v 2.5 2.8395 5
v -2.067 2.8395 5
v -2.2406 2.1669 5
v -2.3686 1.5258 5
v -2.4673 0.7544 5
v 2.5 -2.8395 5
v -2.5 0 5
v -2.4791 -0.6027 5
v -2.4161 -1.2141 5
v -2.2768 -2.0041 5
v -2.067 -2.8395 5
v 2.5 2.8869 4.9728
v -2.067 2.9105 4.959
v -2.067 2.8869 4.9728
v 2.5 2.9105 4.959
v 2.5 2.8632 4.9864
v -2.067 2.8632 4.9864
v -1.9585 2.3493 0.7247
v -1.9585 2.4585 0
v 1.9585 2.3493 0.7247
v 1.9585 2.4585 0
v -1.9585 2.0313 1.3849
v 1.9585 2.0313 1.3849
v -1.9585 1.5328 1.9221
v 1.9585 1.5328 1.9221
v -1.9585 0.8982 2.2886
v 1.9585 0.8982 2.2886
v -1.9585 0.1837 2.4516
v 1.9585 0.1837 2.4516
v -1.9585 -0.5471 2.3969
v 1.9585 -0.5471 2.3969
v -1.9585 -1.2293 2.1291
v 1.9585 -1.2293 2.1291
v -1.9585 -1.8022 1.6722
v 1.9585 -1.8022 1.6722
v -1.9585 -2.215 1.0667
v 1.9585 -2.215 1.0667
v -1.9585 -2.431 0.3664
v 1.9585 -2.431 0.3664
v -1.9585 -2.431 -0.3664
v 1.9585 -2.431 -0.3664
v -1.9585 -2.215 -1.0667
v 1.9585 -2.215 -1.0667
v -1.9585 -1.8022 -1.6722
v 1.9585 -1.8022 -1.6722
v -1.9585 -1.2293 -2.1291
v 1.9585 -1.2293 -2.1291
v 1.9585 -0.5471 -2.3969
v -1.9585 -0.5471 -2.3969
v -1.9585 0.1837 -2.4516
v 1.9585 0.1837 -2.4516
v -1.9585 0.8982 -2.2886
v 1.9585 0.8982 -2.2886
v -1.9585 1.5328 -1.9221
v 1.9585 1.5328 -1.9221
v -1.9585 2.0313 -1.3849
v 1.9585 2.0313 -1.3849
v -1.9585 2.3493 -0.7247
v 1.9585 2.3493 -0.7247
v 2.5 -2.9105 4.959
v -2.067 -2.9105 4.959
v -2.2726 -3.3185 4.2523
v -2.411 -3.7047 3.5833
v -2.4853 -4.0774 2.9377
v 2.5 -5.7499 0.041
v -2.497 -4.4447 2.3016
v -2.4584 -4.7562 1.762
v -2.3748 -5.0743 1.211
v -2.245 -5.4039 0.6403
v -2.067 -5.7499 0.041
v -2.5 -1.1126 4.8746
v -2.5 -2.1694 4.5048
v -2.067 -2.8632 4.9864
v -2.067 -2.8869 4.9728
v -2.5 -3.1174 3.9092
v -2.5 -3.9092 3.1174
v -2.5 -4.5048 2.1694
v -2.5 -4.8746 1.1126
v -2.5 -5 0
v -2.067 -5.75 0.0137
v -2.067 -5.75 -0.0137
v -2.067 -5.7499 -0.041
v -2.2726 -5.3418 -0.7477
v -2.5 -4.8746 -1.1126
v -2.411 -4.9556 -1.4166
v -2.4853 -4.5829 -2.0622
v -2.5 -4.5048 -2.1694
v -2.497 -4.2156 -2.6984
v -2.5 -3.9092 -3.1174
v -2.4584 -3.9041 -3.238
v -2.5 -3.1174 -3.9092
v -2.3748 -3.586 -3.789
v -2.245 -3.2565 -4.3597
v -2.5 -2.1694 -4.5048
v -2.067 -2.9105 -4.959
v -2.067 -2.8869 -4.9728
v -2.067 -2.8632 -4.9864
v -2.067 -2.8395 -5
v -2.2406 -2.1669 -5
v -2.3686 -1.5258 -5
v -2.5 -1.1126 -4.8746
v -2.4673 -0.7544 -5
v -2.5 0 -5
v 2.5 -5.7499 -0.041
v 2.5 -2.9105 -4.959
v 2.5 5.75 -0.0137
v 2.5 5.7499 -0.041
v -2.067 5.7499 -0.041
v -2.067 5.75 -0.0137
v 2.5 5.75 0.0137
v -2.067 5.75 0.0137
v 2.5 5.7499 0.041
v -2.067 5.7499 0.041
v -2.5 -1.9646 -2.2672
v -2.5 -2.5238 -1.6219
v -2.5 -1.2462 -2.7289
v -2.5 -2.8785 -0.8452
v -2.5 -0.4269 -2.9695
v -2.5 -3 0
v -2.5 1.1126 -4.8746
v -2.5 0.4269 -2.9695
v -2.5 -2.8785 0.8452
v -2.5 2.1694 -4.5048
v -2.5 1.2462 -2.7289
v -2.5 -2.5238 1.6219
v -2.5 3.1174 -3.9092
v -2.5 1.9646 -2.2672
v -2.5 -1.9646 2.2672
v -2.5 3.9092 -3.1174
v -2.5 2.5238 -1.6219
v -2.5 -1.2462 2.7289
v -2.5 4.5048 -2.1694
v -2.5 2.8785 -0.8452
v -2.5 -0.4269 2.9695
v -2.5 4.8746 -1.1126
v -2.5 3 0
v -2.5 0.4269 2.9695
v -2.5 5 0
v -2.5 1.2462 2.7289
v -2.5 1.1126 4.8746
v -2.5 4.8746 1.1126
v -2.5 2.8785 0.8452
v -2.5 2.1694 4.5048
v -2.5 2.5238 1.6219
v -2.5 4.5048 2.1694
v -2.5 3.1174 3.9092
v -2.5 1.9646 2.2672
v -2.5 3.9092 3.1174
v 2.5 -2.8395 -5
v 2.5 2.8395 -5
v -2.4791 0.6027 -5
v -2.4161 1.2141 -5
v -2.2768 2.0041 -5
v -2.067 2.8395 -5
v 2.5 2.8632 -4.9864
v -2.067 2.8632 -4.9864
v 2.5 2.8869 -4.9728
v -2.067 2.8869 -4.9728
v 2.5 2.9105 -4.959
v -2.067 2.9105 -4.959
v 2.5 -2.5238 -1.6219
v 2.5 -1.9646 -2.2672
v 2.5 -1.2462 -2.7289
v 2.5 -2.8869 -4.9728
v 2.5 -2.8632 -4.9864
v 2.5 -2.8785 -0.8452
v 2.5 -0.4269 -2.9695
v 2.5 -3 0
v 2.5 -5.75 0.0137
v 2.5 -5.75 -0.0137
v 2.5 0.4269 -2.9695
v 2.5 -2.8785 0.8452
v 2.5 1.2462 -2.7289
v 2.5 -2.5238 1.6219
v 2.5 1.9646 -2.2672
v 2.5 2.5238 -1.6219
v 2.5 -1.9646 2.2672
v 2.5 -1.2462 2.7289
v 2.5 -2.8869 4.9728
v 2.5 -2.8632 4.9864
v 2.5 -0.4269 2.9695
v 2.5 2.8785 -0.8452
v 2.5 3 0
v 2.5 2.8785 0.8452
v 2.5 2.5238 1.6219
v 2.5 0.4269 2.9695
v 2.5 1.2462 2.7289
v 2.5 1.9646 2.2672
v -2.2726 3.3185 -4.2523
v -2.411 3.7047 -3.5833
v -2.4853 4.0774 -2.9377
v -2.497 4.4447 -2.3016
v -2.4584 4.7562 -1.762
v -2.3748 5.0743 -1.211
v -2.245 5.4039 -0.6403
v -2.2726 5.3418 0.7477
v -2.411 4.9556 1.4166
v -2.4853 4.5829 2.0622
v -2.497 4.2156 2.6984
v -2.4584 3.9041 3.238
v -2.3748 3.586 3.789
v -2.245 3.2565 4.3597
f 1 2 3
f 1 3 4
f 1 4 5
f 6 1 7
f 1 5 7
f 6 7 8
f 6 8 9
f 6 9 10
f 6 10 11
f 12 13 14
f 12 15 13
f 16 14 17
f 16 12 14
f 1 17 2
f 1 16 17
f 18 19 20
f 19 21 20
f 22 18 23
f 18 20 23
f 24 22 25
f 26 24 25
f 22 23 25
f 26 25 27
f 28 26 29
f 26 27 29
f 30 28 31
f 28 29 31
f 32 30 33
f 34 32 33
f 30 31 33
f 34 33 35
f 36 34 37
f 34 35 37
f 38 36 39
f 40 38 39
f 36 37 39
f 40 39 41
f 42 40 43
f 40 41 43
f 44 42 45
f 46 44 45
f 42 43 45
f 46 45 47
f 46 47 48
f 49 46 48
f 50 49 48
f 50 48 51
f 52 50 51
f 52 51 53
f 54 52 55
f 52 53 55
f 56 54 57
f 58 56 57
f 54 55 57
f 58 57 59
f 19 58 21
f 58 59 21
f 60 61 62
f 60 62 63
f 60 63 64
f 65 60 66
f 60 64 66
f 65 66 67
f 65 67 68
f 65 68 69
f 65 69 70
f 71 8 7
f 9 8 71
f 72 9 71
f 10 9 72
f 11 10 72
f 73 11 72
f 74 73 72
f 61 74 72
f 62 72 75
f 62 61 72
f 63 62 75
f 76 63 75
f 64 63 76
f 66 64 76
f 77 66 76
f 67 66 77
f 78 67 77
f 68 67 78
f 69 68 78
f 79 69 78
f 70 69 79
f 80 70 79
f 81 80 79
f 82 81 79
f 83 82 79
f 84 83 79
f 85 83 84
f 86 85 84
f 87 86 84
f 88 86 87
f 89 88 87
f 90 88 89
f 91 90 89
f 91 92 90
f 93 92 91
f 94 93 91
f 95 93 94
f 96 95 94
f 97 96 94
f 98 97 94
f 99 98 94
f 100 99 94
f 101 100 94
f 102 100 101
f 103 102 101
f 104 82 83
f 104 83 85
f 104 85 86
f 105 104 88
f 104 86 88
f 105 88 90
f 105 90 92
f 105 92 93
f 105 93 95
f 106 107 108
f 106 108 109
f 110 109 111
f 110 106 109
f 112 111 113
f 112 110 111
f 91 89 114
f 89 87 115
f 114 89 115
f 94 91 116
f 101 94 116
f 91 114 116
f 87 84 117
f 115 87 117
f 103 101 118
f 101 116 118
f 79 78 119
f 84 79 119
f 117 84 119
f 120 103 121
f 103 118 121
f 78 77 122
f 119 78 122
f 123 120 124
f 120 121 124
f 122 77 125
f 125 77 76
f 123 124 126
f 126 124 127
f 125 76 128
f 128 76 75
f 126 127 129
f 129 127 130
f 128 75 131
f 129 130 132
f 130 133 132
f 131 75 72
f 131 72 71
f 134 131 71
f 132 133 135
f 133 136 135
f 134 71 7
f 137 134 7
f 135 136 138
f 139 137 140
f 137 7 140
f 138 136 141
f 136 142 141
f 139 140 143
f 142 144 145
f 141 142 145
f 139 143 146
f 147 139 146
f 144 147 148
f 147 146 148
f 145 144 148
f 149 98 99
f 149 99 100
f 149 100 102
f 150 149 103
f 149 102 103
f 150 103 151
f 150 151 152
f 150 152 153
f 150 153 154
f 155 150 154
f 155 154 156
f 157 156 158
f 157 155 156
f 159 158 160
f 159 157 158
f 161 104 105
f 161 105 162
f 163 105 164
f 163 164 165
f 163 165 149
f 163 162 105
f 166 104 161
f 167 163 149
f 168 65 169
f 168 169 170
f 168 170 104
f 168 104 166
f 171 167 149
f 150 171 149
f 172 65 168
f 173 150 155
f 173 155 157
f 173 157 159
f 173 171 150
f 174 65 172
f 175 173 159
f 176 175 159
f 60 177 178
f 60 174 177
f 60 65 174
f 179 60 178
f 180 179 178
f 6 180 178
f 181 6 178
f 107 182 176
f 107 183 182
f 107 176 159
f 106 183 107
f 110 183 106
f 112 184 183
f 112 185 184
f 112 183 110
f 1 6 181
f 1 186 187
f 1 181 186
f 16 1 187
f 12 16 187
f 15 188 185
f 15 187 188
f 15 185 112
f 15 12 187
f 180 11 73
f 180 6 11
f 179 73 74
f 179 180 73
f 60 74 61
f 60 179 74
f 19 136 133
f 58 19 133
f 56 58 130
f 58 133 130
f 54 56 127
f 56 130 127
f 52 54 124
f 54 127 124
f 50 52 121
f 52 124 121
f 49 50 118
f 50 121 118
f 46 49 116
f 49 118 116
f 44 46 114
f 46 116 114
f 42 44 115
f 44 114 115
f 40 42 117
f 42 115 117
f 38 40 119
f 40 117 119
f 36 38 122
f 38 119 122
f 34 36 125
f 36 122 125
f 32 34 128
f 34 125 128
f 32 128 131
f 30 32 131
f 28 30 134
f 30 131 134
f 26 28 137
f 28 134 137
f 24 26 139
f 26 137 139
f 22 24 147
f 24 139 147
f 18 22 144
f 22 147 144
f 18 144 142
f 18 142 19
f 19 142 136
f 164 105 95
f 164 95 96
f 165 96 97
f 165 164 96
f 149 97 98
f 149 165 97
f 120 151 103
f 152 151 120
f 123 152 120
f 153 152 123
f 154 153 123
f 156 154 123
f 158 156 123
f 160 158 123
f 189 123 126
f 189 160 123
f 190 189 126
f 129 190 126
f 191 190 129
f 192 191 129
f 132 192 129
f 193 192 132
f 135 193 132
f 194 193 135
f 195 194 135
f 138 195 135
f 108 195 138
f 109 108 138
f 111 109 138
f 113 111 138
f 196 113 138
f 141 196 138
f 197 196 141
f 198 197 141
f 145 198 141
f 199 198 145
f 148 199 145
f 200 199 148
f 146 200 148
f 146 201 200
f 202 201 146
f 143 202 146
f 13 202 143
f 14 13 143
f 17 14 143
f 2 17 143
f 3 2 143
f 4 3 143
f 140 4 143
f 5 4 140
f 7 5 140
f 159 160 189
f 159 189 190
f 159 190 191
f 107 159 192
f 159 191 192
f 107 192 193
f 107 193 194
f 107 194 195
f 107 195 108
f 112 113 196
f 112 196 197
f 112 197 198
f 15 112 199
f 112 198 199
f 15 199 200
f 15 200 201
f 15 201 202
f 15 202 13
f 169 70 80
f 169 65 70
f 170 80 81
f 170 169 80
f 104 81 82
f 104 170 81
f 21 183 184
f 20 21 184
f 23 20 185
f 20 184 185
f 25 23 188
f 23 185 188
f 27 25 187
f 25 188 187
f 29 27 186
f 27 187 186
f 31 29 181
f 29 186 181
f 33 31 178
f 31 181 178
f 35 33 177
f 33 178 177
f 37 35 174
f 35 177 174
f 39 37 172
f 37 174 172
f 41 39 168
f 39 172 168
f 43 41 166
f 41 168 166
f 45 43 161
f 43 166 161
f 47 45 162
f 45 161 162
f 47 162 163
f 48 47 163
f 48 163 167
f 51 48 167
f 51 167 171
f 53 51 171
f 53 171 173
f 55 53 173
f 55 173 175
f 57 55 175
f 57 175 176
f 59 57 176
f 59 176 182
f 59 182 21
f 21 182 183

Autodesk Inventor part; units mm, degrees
sketch "Sketch_1" plane through (0, 0, 0) normal (0, 0, 1) x (1, 0, 0)
  line L0 (2.5, 0) -> (-2.5, 0)
  line L1 (-2.5, 0) -> (-2.5, 5)
  line L2 (-2.5, 5) -> (-2.067, 5.75)
  line L3 (-2.067, 5.75) -> (2.5, 5.75)
  line L4 (2.5, 5.75) -> (2.5, 0)
  line L5 (2.5, 0) -> (-2.5, 0)
revolve "Revolution1" add sketch "Sketch_1" angle 360 about axis through (2.5, 0, 0) along (1, 0, 0)
sketch "Sketch_2" plane through (0, 0, 0) normal (0, 0, 1) x (1, 0, 0)
  line L0 (2.5, 0) -> (-2.5, 0)
  line L1 (-2.5, 0) -> (-2.5, 3)
  line L2 (-2.5, 3) -> (-1.9585, 2.4585)
  line L3 (-1.9585, 2.4585) -> (1.9585, 2.4585)
  line L4 (1.9585, 2.4585) -> (2.5, 3)
  line L5 (2.5, 3) -> (2.5, 0)
  line L6 (2.5, 0) -> (-2.5, 0)
revolve "Revolution2" cut sketch "Sketch_2" angle 360 about axis through (2.5, 0, 0) along (1, 0, 0)
thread "Thread1" size "M6x1" class "6H" standard "ISO Metric profile" full length
sketch "Sketch_3" plane through (0, 0, 0) normal (1, 0, 0) x (0, 1, 0)
  line L0 (-10, 10) -> (-10, -10)
  line L1 (-10, -10) -> (10, -10)
  line L2 (10, -10) -> (10, 10)
  line L3 (10, 10) -> (-10, 10)
  line L4 (-2.8868, 5) -> (-5.7735, 0)
  line L5 (-5.7735, 0) -> (-2.8868, -5)
  line L6 (-2.8868, -5) -> (2.8868, -5)
  line L7 (2.8868, -5) -> (5.7735, 0)
  line L8 (5.7735, 0) -> (2.8868, 5)
  line L9 (2.8868, 5) -> (-2.8868, 5)
extrude "Extrusion1" cut sketch "Sketch_3" along normal mid plane 5
ref_plane "cp_XY" through (2.5, 0, 0) normal (1, 0, 0) x (0, 0, -1)
ref_plane "cp_YZ" through (2.5, 0, 0) normal (0, 0, -1) x (0, 1, 0)
ref_plane "cp_ZX" through (2.5, 0, 0) normal (0, 1, 0) x (1, 0, 0)
ref_plane "nut_to_screw_XY" through (0, 0, 0) normal (1, 0, 0) x (0, 0, -1)
ref_plane "nut_to_screw_YZ" through (0, 0, 0) normal (0, 0, -1) x (0, 1, 0)
ref_plane "nut_to_screw_ZX" through (0, 0, 0) normal (0, 1, 0) x (1, 0, 0)
properties part number "SLBNR6"
